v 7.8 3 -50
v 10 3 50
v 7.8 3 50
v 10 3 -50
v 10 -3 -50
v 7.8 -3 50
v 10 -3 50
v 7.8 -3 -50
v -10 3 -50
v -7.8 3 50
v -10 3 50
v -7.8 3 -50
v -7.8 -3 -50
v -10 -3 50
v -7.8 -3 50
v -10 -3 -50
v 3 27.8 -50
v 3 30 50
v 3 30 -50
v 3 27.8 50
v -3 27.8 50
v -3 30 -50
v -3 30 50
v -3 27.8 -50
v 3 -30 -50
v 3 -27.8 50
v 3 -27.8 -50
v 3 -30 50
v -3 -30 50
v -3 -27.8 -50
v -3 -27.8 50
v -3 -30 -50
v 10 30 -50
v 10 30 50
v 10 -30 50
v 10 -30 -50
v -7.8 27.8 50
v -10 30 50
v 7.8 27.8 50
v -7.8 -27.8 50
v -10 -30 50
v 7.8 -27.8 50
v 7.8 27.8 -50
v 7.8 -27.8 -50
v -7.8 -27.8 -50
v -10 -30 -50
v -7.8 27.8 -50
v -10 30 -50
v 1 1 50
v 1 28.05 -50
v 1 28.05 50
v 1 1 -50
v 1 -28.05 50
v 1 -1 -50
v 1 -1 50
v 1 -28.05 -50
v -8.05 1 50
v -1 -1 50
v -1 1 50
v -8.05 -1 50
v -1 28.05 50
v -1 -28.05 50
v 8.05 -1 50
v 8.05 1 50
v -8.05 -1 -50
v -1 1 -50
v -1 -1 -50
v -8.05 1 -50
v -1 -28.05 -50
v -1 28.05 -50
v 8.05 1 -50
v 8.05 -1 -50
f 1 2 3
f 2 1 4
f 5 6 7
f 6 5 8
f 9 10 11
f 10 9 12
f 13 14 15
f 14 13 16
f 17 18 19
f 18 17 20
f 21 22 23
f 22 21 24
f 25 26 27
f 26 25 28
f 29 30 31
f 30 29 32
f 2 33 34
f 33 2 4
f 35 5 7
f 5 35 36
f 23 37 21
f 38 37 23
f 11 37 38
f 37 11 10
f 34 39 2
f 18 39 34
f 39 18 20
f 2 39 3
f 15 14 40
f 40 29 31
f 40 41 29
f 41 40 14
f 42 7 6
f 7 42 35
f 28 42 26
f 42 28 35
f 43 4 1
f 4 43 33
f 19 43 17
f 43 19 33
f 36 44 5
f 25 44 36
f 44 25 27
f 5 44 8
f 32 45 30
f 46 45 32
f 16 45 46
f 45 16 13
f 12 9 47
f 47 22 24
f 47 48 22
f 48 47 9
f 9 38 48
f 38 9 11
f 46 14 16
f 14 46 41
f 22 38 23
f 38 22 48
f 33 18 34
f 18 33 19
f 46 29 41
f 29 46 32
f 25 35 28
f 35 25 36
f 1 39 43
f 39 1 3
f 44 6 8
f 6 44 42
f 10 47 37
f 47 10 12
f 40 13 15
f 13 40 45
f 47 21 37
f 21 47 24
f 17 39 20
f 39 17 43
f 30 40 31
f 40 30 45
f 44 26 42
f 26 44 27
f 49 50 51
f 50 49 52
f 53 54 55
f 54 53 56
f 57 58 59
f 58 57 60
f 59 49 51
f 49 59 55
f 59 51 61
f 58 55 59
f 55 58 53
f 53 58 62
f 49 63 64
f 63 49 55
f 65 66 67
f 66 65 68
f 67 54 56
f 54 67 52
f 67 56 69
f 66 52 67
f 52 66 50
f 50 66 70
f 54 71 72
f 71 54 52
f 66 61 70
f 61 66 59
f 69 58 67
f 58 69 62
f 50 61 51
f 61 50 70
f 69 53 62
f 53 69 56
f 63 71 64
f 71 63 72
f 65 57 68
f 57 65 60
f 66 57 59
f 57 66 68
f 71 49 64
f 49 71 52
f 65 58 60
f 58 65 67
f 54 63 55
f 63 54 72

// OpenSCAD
// 20x60 aluminium T-slot extrusion (simplified but recognizable), 100mm long
// One connected solid, no floating parts

// Parameters
w = 20.0;          // X (mm)
h = 60.0;          // Y (mm)
len = 100.0;       // Z (mm)

wall = 2.2;        // outer wall thickness
slot_open = 6.0;   // T-slot mouth opening
slot_depth = 7.0;  // depth from outer face to inner cavity
slot_cavity = 12.0;// inner cavity width behind mouth (T-nut area)
center_bore_d = 6.0;

web = 2.0;         // internal web thickness
overlap = 0.25;    // small overlap for robust CSG

$fn = 64;

module tslot_cut_x() {
    // Cuts a T-slot from +X face inward (along -X)
    union() {
        // Mouth (narrow)
        translate([ w/2 - slot_depth/2 + overlap, 0, 0 ])
            cube([ slot_depth + 2*overlap, slot_open, len + 2*overlap ], center=true);

        // Cavity (wider) behind mouth
        translate([ w/2 - slot_depth - slot_depth/2 + overlap, 0, 0 ])
            cube([ slot_depth + 2*overlap, slot_cavity, len + 2*overlap ], center=true);
    }
}

module tslot_cut_y() {
    // Cuts a T-slot from +Y face inward (along -Y)
    union() {
        // Mouth (narrow)
        translate([ 0, h/2 - slot_depth/2 + overlap, 0 ])
            cube([ slot_open, slot_depth + 2*overlap, len + 2*overlap ], center=true);

        // Cavity (wider) behind mouth
        translate([ 0, h/2 - slot_depth - slot_depth/2 + overlap, 0 ])
            cube([ slot_cavity, slot_depth + 2*overlap, len + 2*overlap ], center=true);
    }
}

module extrusion_20x60() {
    color([0.85, 0.85, 0.8])
    union() {
        // Main body with slots and center bore removed
        difference() {
            // Outer boundary (ensures correct 20x60 proportions)
            cube([w, h, len], center=true);

            // Inner void (keeps outer walls)
            cube([w - 2*wall, h - 2*wall, len + 2*overlap], center=true);

            // Four T-slots (one per face)
            tslot_cut_x();
            mirror([1,0,0]) tslot_cut_x();
            tslot_cut_y();
            mirror([0,1,0]) tslot_cut_y();

            // Center bore
            cylinder(d=center_bore_d, h=len + 2*overlap, center=true);
        }

        // Internal webs (ADDED via union so they are not subtracted away)
        // Slightly oversized to guarantee overlap with the remaining shell
        cube([web, h - 2*wall + 2*overlap, len], center=true); // vertical web
        cube([w - 2*wall + 2*overlap, web, len], center=true); // horizontal web
    }
}

extrusion_20x60();
